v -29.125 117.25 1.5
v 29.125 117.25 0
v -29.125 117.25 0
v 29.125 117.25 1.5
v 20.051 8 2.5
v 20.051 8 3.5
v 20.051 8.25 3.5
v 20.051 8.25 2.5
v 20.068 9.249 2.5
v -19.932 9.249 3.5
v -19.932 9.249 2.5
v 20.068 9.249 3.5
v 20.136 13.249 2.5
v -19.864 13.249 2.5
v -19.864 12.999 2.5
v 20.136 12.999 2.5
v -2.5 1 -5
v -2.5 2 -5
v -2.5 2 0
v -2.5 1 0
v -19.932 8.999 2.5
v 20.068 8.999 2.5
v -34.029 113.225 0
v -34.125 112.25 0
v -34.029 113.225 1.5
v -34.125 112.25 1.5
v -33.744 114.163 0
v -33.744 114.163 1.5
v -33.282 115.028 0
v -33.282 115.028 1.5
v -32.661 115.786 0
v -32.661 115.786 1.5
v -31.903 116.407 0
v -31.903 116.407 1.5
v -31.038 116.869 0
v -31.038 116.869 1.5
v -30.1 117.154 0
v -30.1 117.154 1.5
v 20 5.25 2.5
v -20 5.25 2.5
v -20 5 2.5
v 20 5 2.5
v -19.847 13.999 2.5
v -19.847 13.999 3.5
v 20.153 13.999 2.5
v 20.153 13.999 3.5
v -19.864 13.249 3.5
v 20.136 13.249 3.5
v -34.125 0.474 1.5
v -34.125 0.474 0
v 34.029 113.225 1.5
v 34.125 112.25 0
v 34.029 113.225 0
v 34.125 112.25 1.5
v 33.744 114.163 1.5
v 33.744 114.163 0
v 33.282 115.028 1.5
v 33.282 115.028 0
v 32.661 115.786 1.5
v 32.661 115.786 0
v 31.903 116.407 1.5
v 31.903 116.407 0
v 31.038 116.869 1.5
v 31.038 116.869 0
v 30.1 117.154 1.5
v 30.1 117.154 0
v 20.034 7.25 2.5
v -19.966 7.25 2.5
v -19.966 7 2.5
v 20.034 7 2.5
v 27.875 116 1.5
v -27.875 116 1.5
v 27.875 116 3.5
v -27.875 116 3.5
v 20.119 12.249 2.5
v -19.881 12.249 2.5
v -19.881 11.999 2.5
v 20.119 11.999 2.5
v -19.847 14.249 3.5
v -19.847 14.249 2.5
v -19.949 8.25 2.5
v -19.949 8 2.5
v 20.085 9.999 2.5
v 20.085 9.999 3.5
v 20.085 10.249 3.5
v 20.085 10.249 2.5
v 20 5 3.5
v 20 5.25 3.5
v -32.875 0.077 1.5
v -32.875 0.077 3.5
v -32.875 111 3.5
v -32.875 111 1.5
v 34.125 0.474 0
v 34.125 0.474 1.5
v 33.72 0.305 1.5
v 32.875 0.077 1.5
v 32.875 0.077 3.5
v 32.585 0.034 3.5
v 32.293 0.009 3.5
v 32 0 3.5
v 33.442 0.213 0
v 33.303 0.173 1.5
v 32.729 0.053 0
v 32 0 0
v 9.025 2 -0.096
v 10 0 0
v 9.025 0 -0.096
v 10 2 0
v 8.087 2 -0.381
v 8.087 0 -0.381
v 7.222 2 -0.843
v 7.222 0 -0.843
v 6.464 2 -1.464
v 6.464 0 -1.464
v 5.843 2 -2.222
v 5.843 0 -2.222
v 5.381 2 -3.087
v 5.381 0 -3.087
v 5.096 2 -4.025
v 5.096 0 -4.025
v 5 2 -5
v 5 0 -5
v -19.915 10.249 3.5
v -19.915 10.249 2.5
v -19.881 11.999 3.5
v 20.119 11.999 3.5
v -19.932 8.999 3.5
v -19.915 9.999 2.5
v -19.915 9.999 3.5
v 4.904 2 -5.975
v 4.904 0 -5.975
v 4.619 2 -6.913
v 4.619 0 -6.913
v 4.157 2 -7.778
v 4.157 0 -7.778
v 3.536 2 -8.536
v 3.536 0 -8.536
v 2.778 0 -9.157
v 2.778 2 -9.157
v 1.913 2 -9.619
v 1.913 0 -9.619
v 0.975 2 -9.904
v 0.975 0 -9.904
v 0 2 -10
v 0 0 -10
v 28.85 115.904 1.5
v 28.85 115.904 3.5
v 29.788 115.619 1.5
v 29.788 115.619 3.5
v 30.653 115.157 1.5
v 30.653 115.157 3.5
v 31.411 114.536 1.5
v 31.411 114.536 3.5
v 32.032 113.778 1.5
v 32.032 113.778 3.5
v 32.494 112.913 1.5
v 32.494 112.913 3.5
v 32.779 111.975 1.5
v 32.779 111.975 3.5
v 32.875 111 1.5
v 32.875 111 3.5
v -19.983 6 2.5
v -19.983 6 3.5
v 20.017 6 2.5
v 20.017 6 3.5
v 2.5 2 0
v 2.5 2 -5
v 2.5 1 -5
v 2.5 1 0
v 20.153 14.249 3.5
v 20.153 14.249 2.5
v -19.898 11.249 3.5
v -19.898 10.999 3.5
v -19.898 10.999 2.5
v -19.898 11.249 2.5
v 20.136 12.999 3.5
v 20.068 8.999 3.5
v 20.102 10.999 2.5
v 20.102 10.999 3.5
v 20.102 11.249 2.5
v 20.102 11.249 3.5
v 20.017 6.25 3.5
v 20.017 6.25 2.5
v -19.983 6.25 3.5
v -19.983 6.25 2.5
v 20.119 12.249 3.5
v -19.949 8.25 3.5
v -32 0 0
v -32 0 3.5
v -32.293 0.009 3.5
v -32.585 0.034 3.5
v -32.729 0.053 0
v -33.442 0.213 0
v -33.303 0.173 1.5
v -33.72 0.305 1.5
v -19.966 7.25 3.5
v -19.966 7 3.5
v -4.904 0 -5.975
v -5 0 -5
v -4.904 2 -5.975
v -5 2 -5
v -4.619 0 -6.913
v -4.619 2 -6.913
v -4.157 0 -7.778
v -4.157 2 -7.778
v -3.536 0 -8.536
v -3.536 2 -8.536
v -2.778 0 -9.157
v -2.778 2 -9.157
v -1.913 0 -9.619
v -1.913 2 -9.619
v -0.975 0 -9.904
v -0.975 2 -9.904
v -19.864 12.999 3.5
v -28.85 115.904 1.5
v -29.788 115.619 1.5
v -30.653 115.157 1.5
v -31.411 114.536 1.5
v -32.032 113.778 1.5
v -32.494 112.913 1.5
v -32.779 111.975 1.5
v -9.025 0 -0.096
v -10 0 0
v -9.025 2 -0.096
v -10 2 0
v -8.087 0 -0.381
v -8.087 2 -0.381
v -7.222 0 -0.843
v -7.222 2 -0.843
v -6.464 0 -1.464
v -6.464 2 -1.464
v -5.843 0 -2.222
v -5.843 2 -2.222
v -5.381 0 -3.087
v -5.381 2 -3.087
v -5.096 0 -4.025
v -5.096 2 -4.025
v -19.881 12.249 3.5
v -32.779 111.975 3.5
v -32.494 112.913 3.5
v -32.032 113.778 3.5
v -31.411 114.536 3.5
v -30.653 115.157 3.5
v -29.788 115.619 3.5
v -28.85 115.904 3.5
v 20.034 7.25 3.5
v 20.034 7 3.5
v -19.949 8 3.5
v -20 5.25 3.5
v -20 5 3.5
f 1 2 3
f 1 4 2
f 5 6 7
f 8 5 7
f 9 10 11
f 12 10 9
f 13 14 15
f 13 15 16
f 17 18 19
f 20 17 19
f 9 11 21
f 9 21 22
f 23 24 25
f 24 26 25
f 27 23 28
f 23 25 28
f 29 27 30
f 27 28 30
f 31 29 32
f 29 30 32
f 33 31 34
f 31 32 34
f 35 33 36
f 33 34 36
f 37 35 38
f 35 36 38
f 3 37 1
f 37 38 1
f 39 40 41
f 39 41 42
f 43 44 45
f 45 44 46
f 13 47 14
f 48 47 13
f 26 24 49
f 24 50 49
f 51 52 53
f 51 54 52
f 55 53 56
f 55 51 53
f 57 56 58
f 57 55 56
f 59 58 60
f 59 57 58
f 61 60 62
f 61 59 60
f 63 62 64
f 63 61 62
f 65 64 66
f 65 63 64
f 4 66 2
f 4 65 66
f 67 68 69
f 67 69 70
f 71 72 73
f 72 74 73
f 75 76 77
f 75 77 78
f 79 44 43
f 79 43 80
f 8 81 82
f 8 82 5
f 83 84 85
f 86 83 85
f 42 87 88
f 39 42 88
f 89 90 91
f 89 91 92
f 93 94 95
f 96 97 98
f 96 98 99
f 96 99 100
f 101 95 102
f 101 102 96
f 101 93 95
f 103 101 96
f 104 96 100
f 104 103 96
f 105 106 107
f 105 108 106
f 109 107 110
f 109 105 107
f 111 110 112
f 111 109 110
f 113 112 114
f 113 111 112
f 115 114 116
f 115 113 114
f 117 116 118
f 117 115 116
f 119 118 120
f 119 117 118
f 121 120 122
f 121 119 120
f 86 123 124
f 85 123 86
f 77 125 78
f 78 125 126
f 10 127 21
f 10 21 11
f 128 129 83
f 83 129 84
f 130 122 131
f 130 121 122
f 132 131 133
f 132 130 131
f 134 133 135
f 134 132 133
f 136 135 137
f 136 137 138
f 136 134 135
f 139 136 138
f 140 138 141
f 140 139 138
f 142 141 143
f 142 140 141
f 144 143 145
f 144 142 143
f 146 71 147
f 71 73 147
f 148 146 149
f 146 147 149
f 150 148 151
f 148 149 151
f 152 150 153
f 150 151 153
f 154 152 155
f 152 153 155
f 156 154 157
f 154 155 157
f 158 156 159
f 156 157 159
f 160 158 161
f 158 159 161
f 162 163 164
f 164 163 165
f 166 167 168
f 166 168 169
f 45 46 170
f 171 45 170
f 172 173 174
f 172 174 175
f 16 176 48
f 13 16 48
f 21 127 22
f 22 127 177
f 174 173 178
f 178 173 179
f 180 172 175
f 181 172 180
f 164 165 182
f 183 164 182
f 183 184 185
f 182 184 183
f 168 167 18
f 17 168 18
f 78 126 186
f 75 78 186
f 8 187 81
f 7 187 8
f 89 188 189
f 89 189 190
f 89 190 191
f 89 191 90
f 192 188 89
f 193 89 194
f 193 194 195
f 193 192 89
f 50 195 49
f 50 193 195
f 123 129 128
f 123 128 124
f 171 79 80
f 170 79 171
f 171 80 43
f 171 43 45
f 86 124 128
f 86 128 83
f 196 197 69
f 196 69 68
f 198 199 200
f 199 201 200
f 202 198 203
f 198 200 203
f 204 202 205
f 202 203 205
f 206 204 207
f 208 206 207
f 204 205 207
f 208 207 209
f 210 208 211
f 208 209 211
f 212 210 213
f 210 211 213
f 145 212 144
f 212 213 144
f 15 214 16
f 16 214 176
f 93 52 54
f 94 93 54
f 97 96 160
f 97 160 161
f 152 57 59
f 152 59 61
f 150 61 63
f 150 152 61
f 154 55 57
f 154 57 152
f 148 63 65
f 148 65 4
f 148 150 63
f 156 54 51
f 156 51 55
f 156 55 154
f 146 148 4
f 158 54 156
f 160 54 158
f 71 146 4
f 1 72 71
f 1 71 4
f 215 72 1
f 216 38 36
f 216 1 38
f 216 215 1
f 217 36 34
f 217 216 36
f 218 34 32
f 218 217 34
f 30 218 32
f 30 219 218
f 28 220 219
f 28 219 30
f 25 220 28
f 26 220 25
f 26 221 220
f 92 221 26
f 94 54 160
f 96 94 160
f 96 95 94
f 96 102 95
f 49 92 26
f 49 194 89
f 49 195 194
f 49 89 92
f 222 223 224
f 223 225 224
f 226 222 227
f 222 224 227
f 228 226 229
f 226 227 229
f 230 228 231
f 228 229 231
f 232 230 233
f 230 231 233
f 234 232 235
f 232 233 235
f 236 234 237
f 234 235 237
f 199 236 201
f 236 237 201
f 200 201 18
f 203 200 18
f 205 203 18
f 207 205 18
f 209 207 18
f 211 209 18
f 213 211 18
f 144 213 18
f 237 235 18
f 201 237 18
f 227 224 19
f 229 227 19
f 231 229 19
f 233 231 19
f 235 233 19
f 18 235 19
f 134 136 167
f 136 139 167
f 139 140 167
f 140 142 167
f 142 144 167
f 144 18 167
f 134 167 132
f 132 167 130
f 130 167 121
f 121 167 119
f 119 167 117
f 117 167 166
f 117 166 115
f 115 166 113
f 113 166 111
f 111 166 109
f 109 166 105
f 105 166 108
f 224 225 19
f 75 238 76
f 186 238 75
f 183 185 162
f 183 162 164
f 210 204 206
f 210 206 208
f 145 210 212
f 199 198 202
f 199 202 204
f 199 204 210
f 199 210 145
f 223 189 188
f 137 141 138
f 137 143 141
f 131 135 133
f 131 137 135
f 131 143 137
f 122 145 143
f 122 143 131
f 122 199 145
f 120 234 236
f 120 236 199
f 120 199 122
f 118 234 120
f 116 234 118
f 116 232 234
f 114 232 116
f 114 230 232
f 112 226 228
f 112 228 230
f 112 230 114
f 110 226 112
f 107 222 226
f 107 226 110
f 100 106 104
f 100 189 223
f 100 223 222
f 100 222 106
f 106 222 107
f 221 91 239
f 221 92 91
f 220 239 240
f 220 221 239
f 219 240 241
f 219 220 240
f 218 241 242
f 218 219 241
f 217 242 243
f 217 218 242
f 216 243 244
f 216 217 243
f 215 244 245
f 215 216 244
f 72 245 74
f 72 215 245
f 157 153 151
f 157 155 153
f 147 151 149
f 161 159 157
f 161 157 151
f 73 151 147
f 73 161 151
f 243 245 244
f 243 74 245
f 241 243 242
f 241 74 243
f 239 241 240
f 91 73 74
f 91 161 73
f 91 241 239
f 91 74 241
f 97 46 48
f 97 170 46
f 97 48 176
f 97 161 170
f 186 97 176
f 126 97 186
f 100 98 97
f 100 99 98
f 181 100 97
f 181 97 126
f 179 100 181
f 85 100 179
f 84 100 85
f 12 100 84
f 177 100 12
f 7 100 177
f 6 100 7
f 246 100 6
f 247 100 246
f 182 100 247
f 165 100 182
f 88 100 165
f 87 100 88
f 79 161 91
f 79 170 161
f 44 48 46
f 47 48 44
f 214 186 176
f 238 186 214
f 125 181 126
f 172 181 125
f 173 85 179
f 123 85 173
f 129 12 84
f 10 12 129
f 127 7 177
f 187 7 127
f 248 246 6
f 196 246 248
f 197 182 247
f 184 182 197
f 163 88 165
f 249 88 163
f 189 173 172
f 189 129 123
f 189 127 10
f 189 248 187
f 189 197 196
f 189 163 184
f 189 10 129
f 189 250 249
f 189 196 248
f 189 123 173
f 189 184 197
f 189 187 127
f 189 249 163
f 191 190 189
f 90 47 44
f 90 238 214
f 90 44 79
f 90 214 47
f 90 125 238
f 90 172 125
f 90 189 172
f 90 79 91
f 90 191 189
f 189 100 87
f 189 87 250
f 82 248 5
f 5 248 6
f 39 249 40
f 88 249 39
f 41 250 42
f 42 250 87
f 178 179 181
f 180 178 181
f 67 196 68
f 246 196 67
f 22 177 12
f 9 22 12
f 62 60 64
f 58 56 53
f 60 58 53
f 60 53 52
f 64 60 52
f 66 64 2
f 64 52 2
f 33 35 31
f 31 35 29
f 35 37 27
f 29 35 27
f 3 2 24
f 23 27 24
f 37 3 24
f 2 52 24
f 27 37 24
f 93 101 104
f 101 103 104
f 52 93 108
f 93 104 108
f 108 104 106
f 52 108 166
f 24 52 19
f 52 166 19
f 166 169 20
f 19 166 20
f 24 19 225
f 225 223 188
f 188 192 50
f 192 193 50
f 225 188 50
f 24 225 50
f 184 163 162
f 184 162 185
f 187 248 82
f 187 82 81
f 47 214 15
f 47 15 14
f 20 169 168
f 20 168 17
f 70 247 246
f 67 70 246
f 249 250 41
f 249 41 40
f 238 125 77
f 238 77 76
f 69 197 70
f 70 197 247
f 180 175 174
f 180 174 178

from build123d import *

# Parameters (mm, degrees)
F1_DEPTH  = 116
F2_W      = 68.25
F2_H      = 1.5
F3_DEPTH  = 1.25
F4_R      = 5
F6_DEPTH  = 25
F7_W      = 10
F7_H      = 10
F8_DEPTH  = 2
F9_R      = 4.99999
F10_W     = 5
F10_H     = 5
F11_DEPTH = 1
F12_W     = 40
F12_H     = 0.25
F13_DEPTH = 1


# Not quite as in the source:
# - a fillet or chamfer is up to 0.001 mm smaller than in the source, because OpenCascade refuses the exact size


with BuildPart() as f1:
    # F0 (on Front) → F1 (new body)
    with BuildSketch(Plane.XZ):
        Polygon((32.875, 1.5), (32.875, 3.5), (-32.875, 3.5), (-32.875, 1.5), (-34.125, 1.5), (-34.125, 0), (34.125, 0), (34.125, 1.5), align=None)
    extrude(amount=-F1_DEPTH)

    # F2 (on face) → F3 (join)
    with BuildSketch(Plane(origin=(0, 116, 0), x_dir=(-1, 0, 0), z_dir=(0, 1, 0))):
        with Locations((0, 0.75)):
            Rectangle(F2_W, F2_H)
    extrude(amount=F3_DEPTH)

    # F4
    f4_edges = [f1.edges().sort_by_distance(p)[0] for p in [
        (34.125, 117.25, 0.75),
        (-34.125, 117.25, 0.75),
        (-32.875, 116, 2.5),
        (32.875, 116, 2.5),
    ]]
    fillet(f4_edges, radius=F4_R)

    # F5 (on Top) → F6 (cut)
    with BuildSketch(Plane.XY):
        with BuildLine():
            ThreePointArc((-32, 0), (-35.5355339059, 1.4644660941), (-37, 5))
            Line((-37, 5), (-47.4459486902, 5.1317643374))
            Line((-47.4459486902, 5.1317643374), (-32.4784885049, -8.2395952195))
            Line((-32.4784885049, -8.2395952195), (-32, 0))
        make_face()
        with BuildLine():
            Line((47.8749121428, 4.8458835855), (37, 4.9999998882))
            ThreePointArc((37, 4.9999998882), (35.5355339059, 1.4644659823), (32, -1.118e-07))
            Line((32, -1.118e-07), (31.699370116, -9.054190591))
            Line((31.699370116, -9.054190591), (47.8749121428, 4.8458835855))
        make_face()
    extrude(amount=F6_DEPTH, mode=Mode.SUBTRACT)

    # F7 (on face) → F8 (join)
    with BuildSketch(Plane.XZ):
        with Locations((0, -5)):
            Rectangle(F7_W, F7_H)
    extrude(amount=-F8_DEPTH)

    # F9 (radius 5 in the source; OpenCascade refuses exactly that, so slightly less here)
    f9_edges = [f1.edges().sort_by_distance(p)[0] for p in [
        (5, 1, 0),
        (-5, 1, 0),
        (-5, 1, -10),
        (5, 1, -10),
    ]]
    fillet(f9_edges, radius=F9_R)

    # F10 (on face) → F11 (cut)
    with BuildSketch(Plane(origin=(0, 2, 0), x_dir=(-1, 0, 0), z_dir=(0, 1, 0))):
        with Locations((0, -2.5)):
            Rectangle(F10_W, F10_H)
    extrude(amount=-F11_DEPTH, mode=Mode.SUBTRACT)

    # F12 (on face) → F13 (cut)
    with BuildSketch(Plane.XY.offset(3.5)):
        with Locations((0, 5.125)):
            Rectangle(F12_W, F12_H)
        with Locations((0.0169467185, 6.1248563941)):
            Rectangle(F12_W, F12_H)
        with Locations((0.0338934371, 7.1247127881)):
            Rectangle(F12_W, F12_H)
        with Locations((0.0508401556, 8.1245691822)):
            Rectangle(F12_W, F12_H)
        with Locations((0.0677868742, 9.1244255762)):
            Rectangle(F12_W, F12_H)
        with Locations((0.0847335927, 10.1242819703)):
            Rectangle(F12_W, F12_H)
        with Locations((0.1016803113, 11.1241383643)):
            Rectangle(F12_W, F12_H)
        with Locations((0.1186270298, 12.1239947584)):
            Rectangle(F12_W, F12_H)
        with Locations((0.1355737483, 13.1238511524)):
            Rectangle(F12_W, F12_H)
        with Locations((0.1525204669, 14.1237075465)):
            Rectangle(F12_W, F12_H)
    extrude(amount=-F13_DEPTH, mode=Mode.SUBTRACT)


solid = f1.part
